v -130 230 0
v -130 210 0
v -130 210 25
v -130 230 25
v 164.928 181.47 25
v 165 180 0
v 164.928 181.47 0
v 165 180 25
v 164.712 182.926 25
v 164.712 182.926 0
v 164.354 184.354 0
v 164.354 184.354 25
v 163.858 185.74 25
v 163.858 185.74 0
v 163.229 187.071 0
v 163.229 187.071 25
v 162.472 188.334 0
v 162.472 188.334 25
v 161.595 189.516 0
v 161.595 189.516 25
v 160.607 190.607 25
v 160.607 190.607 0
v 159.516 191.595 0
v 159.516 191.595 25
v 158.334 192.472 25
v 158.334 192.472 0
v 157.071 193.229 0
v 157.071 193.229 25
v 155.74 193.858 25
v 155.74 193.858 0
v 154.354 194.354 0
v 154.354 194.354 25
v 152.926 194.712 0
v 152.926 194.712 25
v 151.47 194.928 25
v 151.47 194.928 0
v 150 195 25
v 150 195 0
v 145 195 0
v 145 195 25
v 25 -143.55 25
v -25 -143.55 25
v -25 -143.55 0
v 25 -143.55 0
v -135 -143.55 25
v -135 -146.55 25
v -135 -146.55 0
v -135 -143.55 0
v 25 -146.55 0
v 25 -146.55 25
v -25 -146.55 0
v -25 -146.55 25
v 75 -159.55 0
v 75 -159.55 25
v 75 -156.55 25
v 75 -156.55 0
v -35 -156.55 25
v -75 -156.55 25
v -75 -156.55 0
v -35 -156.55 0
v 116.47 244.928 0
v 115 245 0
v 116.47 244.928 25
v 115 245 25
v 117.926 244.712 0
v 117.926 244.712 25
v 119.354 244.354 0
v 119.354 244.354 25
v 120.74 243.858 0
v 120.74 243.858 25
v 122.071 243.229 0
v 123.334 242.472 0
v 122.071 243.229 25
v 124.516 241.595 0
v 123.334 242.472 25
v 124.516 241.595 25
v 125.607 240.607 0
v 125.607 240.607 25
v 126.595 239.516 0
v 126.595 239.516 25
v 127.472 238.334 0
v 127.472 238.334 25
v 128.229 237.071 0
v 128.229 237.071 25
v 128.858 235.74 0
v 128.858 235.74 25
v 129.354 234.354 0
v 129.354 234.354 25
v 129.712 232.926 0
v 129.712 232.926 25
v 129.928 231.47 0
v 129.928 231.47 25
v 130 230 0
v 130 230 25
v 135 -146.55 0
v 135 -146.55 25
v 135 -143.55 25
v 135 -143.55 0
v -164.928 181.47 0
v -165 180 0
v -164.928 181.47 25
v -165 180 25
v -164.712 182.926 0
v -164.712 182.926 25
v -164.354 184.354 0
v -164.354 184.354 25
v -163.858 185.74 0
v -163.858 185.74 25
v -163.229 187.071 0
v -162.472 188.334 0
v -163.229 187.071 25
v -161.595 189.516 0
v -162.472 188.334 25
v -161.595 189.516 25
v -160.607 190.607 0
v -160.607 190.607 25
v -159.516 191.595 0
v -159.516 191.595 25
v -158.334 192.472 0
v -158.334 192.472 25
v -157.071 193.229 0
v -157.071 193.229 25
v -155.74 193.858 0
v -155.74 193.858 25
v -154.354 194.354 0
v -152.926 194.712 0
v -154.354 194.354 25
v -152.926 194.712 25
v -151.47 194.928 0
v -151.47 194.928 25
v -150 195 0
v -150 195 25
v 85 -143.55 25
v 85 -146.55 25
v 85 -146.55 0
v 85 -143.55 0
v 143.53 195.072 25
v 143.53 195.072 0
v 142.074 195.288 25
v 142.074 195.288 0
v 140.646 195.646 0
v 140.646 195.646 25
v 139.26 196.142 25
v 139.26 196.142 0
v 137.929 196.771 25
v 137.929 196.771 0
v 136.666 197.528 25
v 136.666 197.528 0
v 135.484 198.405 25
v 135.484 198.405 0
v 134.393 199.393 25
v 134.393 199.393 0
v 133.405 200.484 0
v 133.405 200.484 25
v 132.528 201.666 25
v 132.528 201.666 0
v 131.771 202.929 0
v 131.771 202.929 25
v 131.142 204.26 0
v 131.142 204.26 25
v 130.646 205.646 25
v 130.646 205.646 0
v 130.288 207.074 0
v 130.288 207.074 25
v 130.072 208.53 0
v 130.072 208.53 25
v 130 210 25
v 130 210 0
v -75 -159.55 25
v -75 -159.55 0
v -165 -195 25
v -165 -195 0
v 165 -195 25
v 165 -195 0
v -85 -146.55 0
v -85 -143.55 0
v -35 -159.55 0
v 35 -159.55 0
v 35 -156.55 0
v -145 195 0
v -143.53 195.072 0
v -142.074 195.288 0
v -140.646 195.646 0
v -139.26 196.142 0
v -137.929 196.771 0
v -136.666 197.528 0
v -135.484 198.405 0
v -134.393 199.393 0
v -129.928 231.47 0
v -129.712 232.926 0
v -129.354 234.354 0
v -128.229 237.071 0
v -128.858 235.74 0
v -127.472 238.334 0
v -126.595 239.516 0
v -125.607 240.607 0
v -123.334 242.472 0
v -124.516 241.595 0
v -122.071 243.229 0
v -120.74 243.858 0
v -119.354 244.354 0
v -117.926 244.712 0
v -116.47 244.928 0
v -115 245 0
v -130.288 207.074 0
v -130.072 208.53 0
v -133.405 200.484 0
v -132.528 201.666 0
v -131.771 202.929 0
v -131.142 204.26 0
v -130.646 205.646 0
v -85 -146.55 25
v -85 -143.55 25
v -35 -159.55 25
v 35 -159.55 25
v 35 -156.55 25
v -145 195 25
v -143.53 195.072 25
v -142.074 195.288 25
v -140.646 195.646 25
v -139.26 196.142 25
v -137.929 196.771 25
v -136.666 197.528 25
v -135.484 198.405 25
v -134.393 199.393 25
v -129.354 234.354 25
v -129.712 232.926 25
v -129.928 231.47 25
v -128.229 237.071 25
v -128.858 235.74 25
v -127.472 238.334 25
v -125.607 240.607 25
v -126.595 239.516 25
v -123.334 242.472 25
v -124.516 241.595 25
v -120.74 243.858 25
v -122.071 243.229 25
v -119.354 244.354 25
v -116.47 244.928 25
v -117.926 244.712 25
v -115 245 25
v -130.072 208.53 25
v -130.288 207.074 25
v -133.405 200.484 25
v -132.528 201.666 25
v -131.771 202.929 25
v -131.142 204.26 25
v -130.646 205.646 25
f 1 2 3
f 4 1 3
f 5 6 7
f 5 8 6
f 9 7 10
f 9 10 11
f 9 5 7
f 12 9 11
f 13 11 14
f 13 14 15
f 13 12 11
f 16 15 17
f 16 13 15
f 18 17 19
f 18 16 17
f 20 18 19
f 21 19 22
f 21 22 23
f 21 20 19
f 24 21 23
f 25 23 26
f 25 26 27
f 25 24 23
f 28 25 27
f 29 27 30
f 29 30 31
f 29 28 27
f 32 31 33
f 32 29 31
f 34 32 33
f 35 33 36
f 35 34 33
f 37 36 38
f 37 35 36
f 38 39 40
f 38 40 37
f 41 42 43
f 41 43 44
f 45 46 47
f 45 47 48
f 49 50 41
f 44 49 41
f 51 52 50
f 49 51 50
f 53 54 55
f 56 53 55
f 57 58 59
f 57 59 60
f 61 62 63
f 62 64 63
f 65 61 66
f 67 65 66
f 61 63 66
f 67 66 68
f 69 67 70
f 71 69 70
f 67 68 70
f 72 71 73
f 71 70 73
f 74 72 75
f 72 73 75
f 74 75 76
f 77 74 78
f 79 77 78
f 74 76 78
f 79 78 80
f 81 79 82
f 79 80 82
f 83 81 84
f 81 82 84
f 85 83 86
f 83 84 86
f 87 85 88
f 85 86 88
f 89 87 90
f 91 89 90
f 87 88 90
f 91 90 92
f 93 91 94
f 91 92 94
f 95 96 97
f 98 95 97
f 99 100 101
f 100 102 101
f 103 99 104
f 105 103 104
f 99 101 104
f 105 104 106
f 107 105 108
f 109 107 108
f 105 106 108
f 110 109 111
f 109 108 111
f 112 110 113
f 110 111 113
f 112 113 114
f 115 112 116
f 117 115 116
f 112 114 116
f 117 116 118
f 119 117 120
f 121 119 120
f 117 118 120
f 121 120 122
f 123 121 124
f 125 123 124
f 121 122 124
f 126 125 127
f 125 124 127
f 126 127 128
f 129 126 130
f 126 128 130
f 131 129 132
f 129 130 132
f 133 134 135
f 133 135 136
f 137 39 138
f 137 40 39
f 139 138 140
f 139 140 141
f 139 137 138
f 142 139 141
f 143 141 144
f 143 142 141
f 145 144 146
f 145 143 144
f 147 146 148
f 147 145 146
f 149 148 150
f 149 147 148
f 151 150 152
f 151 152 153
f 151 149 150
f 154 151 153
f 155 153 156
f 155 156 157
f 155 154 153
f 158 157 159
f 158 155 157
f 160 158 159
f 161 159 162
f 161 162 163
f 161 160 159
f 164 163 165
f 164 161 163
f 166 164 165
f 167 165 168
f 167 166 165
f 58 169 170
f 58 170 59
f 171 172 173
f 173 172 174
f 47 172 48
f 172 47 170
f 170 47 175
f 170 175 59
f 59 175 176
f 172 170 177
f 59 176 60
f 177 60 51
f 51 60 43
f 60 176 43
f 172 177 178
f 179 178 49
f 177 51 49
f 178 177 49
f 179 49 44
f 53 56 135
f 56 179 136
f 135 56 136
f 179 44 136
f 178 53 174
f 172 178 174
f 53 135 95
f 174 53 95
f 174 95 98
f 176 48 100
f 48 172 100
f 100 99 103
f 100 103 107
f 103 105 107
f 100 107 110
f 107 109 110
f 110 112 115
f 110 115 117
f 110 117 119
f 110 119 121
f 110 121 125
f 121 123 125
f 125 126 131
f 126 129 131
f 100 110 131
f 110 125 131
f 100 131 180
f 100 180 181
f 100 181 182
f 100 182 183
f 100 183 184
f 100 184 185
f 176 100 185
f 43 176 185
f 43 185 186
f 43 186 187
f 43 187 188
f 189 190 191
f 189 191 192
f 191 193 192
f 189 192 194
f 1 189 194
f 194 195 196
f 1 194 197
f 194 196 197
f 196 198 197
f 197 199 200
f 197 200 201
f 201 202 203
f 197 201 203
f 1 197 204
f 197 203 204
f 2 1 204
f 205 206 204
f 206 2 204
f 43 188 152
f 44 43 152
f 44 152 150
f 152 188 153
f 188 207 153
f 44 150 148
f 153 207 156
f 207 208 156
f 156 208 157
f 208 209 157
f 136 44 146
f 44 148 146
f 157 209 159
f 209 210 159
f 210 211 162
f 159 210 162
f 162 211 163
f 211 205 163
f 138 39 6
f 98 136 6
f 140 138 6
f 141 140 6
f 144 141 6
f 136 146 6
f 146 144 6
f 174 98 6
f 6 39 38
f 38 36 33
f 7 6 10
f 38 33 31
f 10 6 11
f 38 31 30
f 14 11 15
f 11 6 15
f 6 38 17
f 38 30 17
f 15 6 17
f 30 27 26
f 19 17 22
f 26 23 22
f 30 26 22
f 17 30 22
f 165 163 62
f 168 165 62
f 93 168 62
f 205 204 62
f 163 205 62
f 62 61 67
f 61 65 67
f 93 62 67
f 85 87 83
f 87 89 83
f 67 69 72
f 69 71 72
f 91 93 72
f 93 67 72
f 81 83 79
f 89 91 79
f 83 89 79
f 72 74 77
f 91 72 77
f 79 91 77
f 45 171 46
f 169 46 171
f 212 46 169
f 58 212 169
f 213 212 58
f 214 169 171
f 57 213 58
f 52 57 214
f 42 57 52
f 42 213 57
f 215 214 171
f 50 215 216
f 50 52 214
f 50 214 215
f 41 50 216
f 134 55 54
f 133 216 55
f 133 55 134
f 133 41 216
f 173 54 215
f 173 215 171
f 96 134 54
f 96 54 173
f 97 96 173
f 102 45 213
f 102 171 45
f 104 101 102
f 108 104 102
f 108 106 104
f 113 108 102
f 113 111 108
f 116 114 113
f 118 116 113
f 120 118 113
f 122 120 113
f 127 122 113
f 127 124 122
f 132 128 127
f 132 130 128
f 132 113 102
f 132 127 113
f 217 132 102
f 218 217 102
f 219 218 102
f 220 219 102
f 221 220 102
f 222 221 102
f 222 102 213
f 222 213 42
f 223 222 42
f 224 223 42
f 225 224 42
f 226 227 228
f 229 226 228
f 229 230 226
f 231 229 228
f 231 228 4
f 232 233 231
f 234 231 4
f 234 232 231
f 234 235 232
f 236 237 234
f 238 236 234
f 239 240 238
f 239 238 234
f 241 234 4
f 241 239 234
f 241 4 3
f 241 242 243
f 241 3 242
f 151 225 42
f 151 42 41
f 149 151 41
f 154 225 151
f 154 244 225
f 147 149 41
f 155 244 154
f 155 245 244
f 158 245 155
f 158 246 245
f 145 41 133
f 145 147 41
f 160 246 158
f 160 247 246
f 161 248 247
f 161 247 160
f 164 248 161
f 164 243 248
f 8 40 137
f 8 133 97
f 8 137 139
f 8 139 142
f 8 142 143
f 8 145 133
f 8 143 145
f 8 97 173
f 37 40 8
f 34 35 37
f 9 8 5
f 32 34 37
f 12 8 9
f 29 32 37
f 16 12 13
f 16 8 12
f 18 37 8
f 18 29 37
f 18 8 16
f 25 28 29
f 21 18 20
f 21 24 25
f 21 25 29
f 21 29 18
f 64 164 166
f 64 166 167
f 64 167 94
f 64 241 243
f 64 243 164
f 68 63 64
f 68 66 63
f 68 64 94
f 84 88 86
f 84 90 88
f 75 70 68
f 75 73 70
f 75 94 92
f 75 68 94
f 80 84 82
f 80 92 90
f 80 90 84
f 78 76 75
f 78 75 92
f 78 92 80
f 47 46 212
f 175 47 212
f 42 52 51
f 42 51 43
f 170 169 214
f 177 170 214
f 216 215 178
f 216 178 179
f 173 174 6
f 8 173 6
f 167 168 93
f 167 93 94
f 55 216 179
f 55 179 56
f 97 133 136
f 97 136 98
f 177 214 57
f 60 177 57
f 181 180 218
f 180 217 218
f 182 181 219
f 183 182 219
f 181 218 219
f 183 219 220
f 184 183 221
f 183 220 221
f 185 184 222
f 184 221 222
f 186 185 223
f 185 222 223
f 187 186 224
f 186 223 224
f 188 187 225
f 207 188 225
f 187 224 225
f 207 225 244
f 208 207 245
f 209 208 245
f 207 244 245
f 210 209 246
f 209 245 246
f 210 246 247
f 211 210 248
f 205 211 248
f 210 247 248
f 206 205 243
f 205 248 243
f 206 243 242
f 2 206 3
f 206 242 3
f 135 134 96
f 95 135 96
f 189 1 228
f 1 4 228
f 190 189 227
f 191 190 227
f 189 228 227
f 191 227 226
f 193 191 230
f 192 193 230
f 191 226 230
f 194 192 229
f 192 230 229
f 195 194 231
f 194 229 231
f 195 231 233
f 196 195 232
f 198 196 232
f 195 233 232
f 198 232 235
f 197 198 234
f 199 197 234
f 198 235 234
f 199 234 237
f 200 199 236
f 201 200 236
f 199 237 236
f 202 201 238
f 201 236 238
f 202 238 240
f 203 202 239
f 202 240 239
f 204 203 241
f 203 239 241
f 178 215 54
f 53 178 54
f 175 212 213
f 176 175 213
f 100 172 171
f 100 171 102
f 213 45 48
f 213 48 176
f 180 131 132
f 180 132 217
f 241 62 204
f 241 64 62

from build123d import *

# Parameters (mm, degrees)
F0_W     = 330
F0_H     = 390
F1_DEPTH = 25
F2_W     = 260
F2_H     = 25
F3_DEPTH = 50
F4_R     = 15
F5_W     = 50
F5_H     = 3
F5_W_2   = 40
F6_DEPTH = 25


with BuildPart() as f1:
    # F0 (on Top) → F1 (new body)
    with BuildSketch(Plane.XY):
        Rectangle(F0_W, F0_H)
    extrude(amount=F1_DEPTH)

    # F2 (on face) → F3 (join)
    with BuildSketch(Plane(origin=(0, 195, 0), x_dir=(-1, 0, 0), z_dir=(0, 1, 0))):
        with Locations((0, 12.5)):
            Rectangle(F2_W, F2_H)
    extrude(amount=F3_DEPTH)

    # F4
    f4_edges = [f1.edges().sort_by_distance(p)[0] for p in [
        (-165, 195, 12.5),
        (-130, 245, 12.5),
        (130, 245, 12.5),
        (165, 195, 12.5),
        (-130, 195, 12.5),
        (130, 195, 12.5),
    ]]
    fillet(f4_edges, radius=F4_R)

    # F5 (on face) → F6 (cut)
    with BuildSketch(Plane.XY.offset(25)):
        with Locations((-110, -145.050164)):
            Rectangle(F5_W, F5_H)
        with Locations((0, -145.050164)):
            Rectangle(F5_W, F5_H)
        with Locations((110, -145.050164)):
            Rectangle(F5_W, F5_H)
        with Locations((-55, -158.050164)):
            Rectangle(F5_W_2, F5_H)
        with Locations((55, -158.050164)):
            Rectangle(F5_W_2, F5_H)
    extrude(amount=-F6_DEPTH, mode=Mode.SUBTRACT)


solid = f1.part
